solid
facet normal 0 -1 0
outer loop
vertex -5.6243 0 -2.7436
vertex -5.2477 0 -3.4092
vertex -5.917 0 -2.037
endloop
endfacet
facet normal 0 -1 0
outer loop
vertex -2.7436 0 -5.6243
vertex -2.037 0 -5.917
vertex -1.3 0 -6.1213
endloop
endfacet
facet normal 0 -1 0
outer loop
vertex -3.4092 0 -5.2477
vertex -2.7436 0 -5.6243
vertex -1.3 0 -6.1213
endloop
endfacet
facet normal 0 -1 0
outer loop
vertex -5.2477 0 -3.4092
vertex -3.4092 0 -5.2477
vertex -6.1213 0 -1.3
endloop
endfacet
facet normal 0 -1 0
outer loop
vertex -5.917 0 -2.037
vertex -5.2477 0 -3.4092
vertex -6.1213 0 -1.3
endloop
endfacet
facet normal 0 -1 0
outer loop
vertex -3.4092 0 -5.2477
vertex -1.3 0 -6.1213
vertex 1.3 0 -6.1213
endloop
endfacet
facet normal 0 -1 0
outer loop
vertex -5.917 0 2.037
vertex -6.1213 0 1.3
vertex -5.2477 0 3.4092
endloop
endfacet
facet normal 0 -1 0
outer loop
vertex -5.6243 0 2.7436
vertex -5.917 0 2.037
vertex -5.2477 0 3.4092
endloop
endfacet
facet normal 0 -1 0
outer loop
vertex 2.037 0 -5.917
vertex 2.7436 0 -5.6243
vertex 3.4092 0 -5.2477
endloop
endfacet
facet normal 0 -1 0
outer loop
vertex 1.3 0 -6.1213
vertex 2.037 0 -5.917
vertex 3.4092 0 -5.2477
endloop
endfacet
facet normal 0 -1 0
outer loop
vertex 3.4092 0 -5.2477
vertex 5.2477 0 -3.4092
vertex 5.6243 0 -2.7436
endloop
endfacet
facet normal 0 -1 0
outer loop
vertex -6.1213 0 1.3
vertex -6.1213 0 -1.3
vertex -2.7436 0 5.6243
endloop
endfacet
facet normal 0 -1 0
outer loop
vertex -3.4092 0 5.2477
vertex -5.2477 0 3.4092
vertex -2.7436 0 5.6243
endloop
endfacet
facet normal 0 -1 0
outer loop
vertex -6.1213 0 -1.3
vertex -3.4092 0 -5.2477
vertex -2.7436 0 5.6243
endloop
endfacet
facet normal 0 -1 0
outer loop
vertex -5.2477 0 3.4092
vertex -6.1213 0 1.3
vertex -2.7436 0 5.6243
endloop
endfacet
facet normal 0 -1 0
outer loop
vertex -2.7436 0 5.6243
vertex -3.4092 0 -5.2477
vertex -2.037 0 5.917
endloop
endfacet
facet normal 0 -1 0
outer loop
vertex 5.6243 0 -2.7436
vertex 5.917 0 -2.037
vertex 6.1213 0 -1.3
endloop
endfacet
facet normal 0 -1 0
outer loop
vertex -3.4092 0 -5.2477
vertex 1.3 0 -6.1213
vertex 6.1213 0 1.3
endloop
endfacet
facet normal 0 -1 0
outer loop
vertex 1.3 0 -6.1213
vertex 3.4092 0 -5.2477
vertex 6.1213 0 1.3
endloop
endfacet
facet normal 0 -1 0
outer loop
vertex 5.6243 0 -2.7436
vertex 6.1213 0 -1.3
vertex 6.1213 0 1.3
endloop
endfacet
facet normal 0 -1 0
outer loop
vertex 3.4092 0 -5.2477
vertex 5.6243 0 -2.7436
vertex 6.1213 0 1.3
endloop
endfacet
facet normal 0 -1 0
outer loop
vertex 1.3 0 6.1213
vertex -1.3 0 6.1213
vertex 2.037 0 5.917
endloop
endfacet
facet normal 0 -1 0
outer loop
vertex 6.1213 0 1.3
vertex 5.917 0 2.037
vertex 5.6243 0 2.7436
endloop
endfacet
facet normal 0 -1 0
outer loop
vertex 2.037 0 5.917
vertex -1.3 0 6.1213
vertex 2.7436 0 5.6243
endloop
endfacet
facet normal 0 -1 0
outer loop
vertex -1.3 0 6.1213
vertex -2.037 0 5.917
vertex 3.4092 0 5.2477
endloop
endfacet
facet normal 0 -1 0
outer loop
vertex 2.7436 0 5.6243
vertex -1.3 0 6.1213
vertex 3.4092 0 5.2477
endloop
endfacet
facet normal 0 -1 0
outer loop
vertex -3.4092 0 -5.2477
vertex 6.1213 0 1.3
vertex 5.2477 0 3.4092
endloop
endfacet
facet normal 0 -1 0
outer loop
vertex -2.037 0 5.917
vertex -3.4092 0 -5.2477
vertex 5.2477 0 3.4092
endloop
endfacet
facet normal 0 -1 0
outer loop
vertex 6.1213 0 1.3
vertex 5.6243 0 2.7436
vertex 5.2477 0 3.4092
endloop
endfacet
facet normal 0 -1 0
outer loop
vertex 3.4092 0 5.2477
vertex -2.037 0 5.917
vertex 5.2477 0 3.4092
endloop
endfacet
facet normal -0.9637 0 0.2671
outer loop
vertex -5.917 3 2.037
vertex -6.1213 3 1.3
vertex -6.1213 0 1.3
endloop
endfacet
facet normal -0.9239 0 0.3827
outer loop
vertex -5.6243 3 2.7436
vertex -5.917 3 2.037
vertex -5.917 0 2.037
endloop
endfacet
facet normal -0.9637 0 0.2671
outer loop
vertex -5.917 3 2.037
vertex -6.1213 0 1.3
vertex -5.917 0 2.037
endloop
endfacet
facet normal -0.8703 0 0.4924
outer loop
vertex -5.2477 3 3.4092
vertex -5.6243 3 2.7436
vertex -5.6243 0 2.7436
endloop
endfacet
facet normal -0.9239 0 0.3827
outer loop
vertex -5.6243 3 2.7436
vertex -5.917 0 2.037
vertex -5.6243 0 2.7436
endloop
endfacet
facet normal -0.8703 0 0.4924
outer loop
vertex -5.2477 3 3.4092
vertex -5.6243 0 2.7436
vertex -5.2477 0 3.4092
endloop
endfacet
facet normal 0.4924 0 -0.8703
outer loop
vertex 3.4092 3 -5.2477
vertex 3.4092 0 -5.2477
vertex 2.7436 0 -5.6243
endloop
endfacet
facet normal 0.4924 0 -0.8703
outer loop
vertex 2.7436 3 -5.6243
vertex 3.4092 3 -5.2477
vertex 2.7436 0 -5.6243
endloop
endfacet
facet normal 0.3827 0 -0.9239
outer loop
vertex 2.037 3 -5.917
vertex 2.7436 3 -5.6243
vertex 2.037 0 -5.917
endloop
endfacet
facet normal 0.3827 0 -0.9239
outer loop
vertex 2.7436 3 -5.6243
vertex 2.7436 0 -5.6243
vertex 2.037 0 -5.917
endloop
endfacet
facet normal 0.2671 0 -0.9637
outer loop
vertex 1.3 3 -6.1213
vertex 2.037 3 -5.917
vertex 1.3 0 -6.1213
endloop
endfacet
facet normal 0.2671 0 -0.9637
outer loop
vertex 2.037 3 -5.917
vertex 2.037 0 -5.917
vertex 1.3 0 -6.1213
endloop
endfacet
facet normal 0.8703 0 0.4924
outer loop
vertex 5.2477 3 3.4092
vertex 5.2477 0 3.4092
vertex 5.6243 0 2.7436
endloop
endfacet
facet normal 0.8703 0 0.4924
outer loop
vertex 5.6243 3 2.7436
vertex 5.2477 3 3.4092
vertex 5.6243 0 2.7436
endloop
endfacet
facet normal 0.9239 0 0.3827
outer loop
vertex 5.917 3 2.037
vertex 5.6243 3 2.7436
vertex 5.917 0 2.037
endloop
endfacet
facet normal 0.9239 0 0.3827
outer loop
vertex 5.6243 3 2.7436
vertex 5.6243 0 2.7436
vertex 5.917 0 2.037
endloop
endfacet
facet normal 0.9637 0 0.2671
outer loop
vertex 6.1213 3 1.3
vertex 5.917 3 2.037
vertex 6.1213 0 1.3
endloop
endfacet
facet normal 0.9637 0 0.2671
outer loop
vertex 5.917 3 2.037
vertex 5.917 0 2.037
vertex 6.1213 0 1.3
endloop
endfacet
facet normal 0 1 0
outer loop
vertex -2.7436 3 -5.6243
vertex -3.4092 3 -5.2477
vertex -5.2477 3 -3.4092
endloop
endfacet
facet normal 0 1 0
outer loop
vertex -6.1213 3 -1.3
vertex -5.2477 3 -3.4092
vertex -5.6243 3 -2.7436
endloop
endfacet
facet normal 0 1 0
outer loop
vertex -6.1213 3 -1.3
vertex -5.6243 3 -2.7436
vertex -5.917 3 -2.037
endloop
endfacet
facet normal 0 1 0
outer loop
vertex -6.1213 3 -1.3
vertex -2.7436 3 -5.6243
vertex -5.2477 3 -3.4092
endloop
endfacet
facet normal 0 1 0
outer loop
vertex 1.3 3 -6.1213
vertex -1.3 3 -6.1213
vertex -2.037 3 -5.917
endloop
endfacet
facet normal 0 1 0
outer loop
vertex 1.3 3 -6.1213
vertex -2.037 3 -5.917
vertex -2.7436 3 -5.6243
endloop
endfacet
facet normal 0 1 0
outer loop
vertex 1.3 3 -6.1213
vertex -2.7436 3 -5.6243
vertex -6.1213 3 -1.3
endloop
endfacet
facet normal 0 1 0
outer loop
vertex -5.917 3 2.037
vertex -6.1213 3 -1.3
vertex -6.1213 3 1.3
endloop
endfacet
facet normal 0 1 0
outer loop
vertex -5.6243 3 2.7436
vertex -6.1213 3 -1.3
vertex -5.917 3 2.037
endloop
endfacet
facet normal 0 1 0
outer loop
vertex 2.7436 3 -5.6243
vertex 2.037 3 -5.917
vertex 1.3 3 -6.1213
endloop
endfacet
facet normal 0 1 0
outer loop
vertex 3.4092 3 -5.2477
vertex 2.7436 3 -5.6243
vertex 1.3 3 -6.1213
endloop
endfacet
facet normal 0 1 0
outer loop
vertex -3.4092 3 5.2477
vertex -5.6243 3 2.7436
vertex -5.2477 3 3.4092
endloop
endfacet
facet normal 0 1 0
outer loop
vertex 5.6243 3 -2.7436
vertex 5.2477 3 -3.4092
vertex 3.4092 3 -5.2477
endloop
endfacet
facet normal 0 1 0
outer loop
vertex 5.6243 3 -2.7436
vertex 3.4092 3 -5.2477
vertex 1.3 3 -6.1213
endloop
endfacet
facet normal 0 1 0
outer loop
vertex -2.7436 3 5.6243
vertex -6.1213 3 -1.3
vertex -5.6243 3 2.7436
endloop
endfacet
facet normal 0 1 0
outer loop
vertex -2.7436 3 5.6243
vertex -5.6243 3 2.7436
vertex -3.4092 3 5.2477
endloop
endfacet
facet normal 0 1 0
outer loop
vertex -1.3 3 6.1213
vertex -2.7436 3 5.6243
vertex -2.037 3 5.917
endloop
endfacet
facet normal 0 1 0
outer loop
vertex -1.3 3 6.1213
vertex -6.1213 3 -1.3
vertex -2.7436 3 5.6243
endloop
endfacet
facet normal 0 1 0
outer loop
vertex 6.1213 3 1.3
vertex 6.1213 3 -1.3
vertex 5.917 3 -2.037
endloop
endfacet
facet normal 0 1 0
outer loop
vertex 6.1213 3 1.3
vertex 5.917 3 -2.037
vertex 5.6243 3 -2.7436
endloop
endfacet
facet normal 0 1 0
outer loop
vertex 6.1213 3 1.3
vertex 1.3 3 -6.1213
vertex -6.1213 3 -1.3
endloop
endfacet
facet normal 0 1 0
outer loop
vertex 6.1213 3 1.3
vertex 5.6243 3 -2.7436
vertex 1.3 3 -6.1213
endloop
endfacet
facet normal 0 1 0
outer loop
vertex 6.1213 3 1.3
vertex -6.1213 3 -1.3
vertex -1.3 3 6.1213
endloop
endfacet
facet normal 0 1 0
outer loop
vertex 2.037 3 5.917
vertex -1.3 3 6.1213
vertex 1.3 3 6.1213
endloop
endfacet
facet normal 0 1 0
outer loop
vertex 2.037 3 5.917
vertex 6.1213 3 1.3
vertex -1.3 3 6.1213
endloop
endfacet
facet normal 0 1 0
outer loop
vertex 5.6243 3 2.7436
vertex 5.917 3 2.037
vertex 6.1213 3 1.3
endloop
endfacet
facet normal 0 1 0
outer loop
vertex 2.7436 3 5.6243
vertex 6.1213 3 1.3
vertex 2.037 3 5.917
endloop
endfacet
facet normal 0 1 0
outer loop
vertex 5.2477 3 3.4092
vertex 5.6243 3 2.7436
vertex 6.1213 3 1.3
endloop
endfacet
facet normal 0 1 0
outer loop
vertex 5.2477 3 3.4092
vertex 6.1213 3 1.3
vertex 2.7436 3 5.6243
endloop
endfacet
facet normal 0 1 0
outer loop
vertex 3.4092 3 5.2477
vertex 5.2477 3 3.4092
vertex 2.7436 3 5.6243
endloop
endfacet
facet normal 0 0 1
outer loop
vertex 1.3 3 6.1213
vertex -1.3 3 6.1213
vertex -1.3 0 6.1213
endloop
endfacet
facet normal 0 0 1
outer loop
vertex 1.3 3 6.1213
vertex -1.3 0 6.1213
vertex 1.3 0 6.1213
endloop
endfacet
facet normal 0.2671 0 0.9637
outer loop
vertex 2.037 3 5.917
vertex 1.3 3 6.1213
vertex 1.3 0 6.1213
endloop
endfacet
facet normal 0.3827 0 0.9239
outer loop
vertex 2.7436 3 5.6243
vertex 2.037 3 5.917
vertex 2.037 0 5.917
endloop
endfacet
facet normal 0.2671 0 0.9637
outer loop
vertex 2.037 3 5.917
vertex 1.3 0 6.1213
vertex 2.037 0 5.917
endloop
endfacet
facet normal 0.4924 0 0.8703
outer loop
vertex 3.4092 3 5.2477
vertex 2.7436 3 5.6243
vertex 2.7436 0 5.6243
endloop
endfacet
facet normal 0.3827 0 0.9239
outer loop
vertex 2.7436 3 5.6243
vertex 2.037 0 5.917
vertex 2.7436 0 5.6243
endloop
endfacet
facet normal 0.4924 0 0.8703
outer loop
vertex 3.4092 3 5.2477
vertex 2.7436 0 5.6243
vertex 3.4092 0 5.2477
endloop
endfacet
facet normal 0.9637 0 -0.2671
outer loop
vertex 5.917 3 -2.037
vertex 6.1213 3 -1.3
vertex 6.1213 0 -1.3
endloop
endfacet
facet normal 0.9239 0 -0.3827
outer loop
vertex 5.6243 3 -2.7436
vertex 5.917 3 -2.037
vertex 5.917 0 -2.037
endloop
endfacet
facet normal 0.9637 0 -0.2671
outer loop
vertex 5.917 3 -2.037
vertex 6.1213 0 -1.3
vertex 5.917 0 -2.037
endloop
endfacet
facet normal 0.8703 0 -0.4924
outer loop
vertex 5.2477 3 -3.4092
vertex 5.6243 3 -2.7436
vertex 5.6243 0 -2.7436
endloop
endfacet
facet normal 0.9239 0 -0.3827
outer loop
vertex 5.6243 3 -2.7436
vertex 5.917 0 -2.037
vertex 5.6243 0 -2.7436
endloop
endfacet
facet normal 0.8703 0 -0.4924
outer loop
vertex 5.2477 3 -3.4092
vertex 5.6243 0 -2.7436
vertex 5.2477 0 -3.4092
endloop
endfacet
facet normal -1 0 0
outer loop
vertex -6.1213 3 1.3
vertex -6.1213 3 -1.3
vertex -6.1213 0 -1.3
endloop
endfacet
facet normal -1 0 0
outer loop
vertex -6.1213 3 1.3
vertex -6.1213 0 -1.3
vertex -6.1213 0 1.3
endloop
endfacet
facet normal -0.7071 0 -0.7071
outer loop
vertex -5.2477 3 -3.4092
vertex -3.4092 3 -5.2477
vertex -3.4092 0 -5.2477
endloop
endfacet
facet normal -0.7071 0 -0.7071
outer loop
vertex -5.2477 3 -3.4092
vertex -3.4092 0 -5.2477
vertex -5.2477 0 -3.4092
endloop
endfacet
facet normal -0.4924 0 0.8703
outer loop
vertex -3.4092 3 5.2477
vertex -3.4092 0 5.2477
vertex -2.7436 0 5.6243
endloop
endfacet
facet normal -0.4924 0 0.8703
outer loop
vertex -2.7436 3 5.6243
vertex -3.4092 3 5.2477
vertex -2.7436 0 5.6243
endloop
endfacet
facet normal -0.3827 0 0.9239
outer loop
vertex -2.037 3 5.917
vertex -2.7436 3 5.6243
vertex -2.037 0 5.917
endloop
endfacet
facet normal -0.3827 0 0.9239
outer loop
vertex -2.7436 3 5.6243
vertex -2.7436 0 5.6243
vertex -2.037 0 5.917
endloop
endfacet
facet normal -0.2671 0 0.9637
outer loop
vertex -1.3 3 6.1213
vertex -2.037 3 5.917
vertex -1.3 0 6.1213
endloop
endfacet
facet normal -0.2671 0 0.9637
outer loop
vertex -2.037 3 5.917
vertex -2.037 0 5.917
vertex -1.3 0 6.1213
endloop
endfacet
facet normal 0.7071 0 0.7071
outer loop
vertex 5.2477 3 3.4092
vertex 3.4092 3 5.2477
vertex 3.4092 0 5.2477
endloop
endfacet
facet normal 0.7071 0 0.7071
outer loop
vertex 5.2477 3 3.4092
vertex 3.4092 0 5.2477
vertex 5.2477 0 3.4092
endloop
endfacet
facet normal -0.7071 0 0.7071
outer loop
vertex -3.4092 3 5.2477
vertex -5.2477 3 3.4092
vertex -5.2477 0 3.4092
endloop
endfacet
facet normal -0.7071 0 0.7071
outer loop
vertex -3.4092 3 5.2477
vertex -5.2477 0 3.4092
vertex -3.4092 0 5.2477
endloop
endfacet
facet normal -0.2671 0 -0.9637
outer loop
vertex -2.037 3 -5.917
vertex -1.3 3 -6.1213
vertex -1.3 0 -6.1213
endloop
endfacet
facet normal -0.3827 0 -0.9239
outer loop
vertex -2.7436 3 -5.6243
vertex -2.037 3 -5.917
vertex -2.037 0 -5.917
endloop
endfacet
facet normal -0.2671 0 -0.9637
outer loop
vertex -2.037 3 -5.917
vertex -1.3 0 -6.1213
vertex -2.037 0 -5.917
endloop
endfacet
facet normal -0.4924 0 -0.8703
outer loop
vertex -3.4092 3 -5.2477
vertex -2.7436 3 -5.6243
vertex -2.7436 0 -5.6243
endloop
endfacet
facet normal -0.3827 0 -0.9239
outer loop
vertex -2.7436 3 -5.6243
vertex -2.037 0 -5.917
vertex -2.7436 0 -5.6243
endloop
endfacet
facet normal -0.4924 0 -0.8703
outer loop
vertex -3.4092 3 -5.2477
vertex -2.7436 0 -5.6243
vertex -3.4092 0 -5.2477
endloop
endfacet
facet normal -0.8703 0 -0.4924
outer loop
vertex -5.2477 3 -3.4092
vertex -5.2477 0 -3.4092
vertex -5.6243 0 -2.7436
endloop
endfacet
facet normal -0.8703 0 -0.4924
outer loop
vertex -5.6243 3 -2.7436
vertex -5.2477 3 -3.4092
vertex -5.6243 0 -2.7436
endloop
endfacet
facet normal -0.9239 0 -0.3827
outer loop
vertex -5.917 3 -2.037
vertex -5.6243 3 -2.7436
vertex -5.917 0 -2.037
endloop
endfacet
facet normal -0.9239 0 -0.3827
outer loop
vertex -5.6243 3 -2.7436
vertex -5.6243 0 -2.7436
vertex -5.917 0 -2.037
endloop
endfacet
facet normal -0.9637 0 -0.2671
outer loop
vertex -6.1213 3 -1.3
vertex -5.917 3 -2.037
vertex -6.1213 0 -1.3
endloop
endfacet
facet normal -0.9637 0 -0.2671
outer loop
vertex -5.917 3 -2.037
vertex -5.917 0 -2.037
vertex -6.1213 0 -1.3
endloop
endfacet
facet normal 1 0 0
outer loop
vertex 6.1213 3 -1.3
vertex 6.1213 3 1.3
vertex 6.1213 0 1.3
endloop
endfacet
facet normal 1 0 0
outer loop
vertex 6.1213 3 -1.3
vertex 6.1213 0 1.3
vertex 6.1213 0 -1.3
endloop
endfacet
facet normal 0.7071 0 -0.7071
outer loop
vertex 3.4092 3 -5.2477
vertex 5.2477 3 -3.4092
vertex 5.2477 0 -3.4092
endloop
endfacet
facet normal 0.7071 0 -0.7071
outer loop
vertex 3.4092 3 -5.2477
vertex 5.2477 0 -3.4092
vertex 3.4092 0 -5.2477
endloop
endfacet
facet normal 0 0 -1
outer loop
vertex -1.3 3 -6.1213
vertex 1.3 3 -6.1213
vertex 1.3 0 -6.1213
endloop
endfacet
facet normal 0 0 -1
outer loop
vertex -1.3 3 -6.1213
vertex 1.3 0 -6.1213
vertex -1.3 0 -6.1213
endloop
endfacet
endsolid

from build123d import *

# Parameters (mm, degrees)
SKETCH1_R           = 6.257840103
BOSS_EXTRUDE1_DEPTH = 3
SKETCH2_R           = 8.121320344
CUT_EXTRUDE1_DEPTH  = 10.344577331


with BuildPart() as part:
    # Sketch1 → Boss-Extrude1 (new body)
    with BuildSketch(Plane(origin=(0, 0, 0), x_dir=(1, 0, 0), z_dir=(0, 1, 0))):
        with Locations(Location((0, 0, 0), (0, 0, 270))):
            Circle(SKETCH1_R)
    extrude(amount=BOSS_EXTRUDE1_DEPTH)

    # Sketch2 → Cut-Extrude1 (cut, through all)
    with BuildSketch(Plane(origin=(0, 3, 0), x_dir=(1, 0, 0), z_dir=(0, 1, 0))):
        Circle(SKETCH2_R)
        Polygon((6.121320344, -2.535533906), (6.121320344, 2.535533906), (2.535533906, 6.121320344), (-2.535533906, 6.121320344), (-6.121320344, 2.535533906), (-6.121320344, -2.535533906), (-2.535533906, -6.121320344), (2.535533906, -6.121320344), align=None, mode=Mode.SUBTRACT)
    extrude(amount=-CUT_EXTRUDE1_DEPTH, mode=Mode.SUBTRACT)


solid = part.part
